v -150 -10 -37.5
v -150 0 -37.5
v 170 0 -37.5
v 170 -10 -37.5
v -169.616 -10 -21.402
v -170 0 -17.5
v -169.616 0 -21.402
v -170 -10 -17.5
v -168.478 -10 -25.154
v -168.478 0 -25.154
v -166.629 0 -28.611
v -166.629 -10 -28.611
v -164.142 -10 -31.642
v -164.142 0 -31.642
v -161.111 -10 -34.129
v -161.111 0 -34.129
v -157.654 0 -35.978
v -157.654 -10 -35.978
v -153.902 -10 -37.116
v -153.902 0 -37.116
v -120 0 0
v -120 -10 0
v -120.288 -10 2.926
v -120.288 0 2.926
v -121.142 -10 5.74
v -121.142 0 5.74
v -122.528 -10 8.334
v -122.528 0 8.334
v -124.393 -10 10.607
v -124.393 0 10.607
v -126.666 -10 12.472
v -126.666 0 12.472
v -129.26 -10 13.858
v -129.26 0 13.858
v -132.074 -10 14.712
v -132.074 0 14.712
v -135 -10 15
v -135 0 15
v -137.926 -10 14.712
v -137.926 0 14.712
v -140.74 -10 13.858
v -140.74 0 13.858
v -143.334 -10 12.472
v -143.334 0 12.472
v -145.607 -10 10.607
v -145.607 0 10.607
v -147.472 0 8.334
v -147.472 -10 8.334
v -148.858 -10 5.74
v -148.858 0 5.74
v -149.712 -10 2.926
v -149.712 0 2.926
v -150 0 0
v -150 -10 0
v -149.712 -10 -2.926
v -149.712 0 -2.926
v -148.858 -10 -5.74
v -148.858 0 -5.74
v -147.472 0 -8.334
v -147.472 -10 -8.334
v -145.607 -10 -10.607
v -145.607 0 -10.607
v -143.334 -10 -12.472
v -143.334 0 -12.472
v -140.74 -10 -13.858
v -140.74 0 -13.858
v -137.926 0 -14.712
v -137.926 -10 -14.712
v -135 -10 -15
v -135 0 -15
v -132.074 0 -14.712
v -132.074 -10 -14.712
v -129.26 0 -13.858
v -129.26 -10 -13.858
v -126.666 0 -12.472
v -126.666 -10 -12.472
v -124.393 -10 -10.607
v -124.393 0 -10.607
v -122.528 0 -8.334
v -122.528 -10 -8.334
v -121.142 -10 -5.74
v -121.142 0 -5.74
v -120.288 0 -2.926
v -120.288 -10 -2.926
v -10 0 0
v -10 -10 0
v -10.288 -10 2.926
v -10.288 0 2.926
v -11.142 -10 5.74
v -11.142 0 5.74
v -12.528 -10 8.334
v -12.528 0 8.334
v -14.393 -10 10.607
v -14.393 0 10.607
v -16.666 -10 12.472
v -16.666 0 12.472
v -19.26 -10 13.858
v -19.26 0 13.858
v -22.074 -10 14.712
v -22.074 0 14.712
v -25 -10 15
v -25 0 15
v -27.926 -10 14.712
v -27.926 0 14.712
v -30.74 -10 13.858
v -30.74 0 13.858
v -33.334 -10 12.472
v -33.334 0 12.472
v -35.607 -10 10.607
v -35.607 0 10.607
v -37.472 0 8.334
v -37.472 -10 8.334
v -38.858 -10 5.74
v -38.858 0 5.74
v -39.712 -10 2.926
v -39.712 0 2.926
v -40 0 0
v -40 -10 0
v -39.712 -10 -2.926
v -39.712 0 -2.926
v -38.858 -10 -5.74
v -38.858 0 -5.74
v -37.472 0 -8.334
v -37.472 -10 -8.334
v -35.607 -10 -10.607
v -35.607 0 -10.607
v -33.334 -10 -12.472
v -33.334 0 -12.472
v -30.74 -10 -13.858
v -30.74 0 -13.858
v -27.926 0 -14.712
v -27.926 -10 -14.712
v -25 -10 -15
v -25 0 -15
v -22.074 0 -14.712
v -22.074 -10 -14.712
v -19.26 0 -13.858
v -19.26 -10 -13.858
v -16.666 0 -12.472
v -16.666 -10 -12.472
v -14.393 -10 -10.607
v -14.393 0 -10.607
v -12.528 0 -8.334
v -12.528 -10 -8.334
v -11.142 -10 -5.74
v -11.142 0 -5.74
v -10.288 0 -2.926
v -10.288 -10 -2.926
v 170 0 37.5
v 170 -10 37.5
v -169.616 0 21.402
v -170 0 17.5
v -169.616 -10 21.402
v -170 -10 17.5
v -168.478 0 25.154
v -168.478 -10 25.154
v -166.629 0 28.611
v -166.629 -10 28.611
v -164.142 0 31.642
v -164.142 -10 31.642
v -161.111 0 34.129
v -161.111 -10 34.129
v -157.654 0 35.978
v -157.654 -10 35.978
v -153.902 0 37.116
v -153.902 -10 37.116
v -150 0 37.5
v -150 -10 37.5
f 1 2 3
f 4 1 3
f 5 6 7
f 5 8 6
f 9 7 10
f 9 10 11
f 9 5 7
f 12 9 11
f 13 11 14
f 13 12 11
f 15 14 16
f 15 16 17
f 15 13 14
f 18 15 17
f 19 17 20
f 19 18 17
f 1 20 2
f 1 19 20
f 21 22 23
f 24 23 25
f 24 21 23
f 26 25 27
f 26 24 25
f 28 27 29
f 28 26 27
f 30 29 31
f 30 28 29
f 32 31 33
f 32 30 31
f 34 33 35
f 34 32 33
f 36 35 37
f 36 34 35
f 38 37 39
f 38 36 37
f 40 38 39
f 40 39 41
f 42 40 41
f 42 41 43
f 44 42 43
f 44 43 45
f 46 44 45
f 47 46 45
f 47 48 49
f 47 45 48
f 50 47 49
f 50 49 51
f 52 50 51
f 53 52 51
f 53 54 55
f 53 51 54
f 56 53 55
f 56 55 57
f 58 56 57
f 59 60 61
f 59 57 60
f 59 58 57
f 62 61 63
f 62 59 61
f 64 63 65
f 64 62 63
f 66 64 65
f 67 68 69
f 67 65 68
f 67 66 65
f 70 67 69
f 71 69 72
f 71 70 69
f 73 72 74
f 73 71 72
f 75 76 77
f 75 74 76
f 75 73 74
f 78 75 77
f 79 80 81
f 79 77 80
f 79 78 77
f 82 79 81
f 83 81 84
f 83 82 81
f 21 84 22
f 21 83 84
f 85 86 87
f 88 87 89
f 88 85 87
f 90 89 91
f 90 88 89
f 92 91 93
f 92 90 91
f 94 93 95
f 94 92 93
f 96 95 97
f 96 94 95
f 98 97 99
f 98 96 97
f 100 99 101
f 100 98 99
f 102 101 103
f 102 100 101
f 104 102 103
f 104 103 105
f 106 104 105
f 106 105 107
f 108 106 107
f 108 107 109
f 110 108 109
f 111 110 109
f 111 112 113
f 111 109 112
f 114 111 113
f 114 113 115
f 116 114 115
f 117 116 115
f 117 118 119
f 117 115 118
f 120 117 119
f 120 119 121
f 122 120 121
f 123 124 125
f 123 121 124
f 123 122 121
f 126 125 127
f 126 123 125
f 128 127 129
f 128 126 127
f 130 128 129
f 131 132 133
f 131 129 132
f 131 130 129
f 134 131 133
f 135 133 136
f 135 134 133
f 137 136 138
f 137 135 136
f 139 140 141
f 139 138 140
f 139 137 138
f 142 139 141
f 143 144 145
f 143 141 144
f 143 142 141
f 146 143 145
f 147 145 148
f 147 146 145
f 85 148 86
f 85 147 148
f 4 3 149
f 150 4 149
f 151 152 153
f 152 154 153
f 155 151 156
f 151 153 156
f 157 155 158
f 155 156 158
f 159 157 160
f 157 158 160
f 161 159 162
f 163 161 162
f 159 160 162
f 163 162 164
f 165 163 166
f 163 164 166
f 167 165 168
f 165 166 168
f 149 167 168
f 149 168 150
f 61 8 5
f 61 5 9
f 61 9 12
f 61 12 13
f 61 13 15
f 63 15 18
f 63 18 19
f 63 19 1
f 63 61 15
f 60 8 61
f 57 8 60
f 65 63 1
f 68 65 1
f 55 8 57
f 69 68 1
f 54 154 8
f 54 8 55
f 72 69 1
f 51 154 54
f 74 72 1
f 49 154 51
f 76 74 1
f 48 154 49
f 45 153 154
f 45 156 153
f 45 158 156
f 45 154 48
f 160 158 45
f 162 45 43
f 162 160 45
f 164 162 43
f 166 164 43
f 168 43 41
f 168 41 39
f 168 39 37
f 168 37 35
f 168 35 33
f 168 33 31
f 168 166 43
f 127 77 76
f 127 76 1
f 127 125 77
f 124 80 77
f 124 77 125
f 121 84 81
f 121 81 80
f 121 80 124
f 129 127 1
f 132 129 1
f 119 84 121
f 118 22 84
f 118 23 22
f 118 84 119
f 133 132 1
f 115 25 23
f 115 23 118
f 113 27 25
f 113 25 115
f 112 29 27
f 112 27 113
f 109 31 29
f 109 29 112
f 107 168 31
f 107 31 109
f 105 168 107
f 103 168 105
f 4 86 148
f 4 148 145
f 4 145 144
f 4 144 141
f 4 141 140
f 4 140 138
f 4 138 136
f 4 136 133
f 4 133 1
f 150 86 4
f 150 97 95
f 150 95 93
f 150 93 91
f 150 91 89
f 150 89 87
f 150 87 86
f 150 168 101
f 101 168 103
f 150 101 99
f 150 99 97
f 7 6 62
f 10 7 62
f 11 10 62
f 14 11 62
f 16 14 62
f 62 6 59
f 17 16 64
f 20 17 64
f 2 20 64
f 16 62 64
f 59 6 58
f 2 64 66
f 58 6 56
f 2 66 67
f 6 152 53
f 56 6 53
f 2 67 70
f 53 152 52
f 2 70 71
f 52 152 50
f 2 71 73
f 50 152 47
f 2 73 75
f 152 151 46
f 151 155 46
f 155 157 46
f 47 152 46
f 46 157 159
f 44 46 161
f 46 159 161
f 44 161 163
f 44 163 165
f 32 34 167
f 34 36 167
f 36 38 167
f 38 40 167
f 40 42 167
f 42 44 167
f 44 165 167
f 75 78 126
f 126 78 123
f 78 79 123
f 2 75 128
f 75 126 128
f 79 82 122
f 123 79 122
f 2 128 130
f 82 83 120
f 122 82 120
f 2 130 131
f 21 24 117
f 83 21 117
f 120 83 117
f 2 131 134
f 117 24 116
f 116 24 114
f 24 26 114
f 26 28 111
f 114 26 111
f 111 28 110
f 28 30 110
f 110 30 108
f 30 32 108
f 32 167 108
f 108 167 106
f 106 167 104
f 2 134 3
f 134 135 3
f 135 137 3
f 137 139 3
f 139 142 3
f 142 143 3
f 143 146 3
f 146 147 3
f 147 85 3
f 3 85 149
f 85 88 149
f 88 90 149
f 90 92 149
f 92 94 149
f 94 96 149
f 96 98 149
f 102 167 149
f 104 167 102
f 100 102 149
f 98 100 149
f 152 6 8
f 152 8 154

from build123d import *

# Parameters (mm, degrees)
F0_W          = 340
F0_H          = 75
F1_DEPTH      = 10
F2_R          = 20
F3_R          = 15
F4_DEPTH      = 354
F4_DEPTH_BACK = 25


# Not quite as in the source:
# - an extrude ends at something that could not be found from the text; its depth is read off the source's solid


with BuildPart() as f1:
    # F0 (on Front) → F1 (new body)
    with BuildSketch(Plane.XZ):
        Rectangle(F0_W, F0_H)
    extrude(amount=F1_DEPTH)

    # F2
    f2_edges = [f1.edges().sort_by_distance(p)[0] for p in [
        (-170, -5, 37.5),
        (-170, -5, -37.5),
    ]]
    fillet(f2_edges, radius=F2_R)

    # F3 (on Front) → F4 (cut, two sides)
    with BuildSketch(Plane.XZ) as f4_sk:
        with Locations((-135, 0)):
            Circle(F3_R)
        with Locations((-25, 0)):
            Circle(F3_R)
    extrude(amount=-F4_DEPTH, mode=Mode.SUBTRACT)
    extrude(f4_sk.sketch, amount=F4_DEPTH_BACK, mode=Mode.SUBTRACT)


solid = f1.part
